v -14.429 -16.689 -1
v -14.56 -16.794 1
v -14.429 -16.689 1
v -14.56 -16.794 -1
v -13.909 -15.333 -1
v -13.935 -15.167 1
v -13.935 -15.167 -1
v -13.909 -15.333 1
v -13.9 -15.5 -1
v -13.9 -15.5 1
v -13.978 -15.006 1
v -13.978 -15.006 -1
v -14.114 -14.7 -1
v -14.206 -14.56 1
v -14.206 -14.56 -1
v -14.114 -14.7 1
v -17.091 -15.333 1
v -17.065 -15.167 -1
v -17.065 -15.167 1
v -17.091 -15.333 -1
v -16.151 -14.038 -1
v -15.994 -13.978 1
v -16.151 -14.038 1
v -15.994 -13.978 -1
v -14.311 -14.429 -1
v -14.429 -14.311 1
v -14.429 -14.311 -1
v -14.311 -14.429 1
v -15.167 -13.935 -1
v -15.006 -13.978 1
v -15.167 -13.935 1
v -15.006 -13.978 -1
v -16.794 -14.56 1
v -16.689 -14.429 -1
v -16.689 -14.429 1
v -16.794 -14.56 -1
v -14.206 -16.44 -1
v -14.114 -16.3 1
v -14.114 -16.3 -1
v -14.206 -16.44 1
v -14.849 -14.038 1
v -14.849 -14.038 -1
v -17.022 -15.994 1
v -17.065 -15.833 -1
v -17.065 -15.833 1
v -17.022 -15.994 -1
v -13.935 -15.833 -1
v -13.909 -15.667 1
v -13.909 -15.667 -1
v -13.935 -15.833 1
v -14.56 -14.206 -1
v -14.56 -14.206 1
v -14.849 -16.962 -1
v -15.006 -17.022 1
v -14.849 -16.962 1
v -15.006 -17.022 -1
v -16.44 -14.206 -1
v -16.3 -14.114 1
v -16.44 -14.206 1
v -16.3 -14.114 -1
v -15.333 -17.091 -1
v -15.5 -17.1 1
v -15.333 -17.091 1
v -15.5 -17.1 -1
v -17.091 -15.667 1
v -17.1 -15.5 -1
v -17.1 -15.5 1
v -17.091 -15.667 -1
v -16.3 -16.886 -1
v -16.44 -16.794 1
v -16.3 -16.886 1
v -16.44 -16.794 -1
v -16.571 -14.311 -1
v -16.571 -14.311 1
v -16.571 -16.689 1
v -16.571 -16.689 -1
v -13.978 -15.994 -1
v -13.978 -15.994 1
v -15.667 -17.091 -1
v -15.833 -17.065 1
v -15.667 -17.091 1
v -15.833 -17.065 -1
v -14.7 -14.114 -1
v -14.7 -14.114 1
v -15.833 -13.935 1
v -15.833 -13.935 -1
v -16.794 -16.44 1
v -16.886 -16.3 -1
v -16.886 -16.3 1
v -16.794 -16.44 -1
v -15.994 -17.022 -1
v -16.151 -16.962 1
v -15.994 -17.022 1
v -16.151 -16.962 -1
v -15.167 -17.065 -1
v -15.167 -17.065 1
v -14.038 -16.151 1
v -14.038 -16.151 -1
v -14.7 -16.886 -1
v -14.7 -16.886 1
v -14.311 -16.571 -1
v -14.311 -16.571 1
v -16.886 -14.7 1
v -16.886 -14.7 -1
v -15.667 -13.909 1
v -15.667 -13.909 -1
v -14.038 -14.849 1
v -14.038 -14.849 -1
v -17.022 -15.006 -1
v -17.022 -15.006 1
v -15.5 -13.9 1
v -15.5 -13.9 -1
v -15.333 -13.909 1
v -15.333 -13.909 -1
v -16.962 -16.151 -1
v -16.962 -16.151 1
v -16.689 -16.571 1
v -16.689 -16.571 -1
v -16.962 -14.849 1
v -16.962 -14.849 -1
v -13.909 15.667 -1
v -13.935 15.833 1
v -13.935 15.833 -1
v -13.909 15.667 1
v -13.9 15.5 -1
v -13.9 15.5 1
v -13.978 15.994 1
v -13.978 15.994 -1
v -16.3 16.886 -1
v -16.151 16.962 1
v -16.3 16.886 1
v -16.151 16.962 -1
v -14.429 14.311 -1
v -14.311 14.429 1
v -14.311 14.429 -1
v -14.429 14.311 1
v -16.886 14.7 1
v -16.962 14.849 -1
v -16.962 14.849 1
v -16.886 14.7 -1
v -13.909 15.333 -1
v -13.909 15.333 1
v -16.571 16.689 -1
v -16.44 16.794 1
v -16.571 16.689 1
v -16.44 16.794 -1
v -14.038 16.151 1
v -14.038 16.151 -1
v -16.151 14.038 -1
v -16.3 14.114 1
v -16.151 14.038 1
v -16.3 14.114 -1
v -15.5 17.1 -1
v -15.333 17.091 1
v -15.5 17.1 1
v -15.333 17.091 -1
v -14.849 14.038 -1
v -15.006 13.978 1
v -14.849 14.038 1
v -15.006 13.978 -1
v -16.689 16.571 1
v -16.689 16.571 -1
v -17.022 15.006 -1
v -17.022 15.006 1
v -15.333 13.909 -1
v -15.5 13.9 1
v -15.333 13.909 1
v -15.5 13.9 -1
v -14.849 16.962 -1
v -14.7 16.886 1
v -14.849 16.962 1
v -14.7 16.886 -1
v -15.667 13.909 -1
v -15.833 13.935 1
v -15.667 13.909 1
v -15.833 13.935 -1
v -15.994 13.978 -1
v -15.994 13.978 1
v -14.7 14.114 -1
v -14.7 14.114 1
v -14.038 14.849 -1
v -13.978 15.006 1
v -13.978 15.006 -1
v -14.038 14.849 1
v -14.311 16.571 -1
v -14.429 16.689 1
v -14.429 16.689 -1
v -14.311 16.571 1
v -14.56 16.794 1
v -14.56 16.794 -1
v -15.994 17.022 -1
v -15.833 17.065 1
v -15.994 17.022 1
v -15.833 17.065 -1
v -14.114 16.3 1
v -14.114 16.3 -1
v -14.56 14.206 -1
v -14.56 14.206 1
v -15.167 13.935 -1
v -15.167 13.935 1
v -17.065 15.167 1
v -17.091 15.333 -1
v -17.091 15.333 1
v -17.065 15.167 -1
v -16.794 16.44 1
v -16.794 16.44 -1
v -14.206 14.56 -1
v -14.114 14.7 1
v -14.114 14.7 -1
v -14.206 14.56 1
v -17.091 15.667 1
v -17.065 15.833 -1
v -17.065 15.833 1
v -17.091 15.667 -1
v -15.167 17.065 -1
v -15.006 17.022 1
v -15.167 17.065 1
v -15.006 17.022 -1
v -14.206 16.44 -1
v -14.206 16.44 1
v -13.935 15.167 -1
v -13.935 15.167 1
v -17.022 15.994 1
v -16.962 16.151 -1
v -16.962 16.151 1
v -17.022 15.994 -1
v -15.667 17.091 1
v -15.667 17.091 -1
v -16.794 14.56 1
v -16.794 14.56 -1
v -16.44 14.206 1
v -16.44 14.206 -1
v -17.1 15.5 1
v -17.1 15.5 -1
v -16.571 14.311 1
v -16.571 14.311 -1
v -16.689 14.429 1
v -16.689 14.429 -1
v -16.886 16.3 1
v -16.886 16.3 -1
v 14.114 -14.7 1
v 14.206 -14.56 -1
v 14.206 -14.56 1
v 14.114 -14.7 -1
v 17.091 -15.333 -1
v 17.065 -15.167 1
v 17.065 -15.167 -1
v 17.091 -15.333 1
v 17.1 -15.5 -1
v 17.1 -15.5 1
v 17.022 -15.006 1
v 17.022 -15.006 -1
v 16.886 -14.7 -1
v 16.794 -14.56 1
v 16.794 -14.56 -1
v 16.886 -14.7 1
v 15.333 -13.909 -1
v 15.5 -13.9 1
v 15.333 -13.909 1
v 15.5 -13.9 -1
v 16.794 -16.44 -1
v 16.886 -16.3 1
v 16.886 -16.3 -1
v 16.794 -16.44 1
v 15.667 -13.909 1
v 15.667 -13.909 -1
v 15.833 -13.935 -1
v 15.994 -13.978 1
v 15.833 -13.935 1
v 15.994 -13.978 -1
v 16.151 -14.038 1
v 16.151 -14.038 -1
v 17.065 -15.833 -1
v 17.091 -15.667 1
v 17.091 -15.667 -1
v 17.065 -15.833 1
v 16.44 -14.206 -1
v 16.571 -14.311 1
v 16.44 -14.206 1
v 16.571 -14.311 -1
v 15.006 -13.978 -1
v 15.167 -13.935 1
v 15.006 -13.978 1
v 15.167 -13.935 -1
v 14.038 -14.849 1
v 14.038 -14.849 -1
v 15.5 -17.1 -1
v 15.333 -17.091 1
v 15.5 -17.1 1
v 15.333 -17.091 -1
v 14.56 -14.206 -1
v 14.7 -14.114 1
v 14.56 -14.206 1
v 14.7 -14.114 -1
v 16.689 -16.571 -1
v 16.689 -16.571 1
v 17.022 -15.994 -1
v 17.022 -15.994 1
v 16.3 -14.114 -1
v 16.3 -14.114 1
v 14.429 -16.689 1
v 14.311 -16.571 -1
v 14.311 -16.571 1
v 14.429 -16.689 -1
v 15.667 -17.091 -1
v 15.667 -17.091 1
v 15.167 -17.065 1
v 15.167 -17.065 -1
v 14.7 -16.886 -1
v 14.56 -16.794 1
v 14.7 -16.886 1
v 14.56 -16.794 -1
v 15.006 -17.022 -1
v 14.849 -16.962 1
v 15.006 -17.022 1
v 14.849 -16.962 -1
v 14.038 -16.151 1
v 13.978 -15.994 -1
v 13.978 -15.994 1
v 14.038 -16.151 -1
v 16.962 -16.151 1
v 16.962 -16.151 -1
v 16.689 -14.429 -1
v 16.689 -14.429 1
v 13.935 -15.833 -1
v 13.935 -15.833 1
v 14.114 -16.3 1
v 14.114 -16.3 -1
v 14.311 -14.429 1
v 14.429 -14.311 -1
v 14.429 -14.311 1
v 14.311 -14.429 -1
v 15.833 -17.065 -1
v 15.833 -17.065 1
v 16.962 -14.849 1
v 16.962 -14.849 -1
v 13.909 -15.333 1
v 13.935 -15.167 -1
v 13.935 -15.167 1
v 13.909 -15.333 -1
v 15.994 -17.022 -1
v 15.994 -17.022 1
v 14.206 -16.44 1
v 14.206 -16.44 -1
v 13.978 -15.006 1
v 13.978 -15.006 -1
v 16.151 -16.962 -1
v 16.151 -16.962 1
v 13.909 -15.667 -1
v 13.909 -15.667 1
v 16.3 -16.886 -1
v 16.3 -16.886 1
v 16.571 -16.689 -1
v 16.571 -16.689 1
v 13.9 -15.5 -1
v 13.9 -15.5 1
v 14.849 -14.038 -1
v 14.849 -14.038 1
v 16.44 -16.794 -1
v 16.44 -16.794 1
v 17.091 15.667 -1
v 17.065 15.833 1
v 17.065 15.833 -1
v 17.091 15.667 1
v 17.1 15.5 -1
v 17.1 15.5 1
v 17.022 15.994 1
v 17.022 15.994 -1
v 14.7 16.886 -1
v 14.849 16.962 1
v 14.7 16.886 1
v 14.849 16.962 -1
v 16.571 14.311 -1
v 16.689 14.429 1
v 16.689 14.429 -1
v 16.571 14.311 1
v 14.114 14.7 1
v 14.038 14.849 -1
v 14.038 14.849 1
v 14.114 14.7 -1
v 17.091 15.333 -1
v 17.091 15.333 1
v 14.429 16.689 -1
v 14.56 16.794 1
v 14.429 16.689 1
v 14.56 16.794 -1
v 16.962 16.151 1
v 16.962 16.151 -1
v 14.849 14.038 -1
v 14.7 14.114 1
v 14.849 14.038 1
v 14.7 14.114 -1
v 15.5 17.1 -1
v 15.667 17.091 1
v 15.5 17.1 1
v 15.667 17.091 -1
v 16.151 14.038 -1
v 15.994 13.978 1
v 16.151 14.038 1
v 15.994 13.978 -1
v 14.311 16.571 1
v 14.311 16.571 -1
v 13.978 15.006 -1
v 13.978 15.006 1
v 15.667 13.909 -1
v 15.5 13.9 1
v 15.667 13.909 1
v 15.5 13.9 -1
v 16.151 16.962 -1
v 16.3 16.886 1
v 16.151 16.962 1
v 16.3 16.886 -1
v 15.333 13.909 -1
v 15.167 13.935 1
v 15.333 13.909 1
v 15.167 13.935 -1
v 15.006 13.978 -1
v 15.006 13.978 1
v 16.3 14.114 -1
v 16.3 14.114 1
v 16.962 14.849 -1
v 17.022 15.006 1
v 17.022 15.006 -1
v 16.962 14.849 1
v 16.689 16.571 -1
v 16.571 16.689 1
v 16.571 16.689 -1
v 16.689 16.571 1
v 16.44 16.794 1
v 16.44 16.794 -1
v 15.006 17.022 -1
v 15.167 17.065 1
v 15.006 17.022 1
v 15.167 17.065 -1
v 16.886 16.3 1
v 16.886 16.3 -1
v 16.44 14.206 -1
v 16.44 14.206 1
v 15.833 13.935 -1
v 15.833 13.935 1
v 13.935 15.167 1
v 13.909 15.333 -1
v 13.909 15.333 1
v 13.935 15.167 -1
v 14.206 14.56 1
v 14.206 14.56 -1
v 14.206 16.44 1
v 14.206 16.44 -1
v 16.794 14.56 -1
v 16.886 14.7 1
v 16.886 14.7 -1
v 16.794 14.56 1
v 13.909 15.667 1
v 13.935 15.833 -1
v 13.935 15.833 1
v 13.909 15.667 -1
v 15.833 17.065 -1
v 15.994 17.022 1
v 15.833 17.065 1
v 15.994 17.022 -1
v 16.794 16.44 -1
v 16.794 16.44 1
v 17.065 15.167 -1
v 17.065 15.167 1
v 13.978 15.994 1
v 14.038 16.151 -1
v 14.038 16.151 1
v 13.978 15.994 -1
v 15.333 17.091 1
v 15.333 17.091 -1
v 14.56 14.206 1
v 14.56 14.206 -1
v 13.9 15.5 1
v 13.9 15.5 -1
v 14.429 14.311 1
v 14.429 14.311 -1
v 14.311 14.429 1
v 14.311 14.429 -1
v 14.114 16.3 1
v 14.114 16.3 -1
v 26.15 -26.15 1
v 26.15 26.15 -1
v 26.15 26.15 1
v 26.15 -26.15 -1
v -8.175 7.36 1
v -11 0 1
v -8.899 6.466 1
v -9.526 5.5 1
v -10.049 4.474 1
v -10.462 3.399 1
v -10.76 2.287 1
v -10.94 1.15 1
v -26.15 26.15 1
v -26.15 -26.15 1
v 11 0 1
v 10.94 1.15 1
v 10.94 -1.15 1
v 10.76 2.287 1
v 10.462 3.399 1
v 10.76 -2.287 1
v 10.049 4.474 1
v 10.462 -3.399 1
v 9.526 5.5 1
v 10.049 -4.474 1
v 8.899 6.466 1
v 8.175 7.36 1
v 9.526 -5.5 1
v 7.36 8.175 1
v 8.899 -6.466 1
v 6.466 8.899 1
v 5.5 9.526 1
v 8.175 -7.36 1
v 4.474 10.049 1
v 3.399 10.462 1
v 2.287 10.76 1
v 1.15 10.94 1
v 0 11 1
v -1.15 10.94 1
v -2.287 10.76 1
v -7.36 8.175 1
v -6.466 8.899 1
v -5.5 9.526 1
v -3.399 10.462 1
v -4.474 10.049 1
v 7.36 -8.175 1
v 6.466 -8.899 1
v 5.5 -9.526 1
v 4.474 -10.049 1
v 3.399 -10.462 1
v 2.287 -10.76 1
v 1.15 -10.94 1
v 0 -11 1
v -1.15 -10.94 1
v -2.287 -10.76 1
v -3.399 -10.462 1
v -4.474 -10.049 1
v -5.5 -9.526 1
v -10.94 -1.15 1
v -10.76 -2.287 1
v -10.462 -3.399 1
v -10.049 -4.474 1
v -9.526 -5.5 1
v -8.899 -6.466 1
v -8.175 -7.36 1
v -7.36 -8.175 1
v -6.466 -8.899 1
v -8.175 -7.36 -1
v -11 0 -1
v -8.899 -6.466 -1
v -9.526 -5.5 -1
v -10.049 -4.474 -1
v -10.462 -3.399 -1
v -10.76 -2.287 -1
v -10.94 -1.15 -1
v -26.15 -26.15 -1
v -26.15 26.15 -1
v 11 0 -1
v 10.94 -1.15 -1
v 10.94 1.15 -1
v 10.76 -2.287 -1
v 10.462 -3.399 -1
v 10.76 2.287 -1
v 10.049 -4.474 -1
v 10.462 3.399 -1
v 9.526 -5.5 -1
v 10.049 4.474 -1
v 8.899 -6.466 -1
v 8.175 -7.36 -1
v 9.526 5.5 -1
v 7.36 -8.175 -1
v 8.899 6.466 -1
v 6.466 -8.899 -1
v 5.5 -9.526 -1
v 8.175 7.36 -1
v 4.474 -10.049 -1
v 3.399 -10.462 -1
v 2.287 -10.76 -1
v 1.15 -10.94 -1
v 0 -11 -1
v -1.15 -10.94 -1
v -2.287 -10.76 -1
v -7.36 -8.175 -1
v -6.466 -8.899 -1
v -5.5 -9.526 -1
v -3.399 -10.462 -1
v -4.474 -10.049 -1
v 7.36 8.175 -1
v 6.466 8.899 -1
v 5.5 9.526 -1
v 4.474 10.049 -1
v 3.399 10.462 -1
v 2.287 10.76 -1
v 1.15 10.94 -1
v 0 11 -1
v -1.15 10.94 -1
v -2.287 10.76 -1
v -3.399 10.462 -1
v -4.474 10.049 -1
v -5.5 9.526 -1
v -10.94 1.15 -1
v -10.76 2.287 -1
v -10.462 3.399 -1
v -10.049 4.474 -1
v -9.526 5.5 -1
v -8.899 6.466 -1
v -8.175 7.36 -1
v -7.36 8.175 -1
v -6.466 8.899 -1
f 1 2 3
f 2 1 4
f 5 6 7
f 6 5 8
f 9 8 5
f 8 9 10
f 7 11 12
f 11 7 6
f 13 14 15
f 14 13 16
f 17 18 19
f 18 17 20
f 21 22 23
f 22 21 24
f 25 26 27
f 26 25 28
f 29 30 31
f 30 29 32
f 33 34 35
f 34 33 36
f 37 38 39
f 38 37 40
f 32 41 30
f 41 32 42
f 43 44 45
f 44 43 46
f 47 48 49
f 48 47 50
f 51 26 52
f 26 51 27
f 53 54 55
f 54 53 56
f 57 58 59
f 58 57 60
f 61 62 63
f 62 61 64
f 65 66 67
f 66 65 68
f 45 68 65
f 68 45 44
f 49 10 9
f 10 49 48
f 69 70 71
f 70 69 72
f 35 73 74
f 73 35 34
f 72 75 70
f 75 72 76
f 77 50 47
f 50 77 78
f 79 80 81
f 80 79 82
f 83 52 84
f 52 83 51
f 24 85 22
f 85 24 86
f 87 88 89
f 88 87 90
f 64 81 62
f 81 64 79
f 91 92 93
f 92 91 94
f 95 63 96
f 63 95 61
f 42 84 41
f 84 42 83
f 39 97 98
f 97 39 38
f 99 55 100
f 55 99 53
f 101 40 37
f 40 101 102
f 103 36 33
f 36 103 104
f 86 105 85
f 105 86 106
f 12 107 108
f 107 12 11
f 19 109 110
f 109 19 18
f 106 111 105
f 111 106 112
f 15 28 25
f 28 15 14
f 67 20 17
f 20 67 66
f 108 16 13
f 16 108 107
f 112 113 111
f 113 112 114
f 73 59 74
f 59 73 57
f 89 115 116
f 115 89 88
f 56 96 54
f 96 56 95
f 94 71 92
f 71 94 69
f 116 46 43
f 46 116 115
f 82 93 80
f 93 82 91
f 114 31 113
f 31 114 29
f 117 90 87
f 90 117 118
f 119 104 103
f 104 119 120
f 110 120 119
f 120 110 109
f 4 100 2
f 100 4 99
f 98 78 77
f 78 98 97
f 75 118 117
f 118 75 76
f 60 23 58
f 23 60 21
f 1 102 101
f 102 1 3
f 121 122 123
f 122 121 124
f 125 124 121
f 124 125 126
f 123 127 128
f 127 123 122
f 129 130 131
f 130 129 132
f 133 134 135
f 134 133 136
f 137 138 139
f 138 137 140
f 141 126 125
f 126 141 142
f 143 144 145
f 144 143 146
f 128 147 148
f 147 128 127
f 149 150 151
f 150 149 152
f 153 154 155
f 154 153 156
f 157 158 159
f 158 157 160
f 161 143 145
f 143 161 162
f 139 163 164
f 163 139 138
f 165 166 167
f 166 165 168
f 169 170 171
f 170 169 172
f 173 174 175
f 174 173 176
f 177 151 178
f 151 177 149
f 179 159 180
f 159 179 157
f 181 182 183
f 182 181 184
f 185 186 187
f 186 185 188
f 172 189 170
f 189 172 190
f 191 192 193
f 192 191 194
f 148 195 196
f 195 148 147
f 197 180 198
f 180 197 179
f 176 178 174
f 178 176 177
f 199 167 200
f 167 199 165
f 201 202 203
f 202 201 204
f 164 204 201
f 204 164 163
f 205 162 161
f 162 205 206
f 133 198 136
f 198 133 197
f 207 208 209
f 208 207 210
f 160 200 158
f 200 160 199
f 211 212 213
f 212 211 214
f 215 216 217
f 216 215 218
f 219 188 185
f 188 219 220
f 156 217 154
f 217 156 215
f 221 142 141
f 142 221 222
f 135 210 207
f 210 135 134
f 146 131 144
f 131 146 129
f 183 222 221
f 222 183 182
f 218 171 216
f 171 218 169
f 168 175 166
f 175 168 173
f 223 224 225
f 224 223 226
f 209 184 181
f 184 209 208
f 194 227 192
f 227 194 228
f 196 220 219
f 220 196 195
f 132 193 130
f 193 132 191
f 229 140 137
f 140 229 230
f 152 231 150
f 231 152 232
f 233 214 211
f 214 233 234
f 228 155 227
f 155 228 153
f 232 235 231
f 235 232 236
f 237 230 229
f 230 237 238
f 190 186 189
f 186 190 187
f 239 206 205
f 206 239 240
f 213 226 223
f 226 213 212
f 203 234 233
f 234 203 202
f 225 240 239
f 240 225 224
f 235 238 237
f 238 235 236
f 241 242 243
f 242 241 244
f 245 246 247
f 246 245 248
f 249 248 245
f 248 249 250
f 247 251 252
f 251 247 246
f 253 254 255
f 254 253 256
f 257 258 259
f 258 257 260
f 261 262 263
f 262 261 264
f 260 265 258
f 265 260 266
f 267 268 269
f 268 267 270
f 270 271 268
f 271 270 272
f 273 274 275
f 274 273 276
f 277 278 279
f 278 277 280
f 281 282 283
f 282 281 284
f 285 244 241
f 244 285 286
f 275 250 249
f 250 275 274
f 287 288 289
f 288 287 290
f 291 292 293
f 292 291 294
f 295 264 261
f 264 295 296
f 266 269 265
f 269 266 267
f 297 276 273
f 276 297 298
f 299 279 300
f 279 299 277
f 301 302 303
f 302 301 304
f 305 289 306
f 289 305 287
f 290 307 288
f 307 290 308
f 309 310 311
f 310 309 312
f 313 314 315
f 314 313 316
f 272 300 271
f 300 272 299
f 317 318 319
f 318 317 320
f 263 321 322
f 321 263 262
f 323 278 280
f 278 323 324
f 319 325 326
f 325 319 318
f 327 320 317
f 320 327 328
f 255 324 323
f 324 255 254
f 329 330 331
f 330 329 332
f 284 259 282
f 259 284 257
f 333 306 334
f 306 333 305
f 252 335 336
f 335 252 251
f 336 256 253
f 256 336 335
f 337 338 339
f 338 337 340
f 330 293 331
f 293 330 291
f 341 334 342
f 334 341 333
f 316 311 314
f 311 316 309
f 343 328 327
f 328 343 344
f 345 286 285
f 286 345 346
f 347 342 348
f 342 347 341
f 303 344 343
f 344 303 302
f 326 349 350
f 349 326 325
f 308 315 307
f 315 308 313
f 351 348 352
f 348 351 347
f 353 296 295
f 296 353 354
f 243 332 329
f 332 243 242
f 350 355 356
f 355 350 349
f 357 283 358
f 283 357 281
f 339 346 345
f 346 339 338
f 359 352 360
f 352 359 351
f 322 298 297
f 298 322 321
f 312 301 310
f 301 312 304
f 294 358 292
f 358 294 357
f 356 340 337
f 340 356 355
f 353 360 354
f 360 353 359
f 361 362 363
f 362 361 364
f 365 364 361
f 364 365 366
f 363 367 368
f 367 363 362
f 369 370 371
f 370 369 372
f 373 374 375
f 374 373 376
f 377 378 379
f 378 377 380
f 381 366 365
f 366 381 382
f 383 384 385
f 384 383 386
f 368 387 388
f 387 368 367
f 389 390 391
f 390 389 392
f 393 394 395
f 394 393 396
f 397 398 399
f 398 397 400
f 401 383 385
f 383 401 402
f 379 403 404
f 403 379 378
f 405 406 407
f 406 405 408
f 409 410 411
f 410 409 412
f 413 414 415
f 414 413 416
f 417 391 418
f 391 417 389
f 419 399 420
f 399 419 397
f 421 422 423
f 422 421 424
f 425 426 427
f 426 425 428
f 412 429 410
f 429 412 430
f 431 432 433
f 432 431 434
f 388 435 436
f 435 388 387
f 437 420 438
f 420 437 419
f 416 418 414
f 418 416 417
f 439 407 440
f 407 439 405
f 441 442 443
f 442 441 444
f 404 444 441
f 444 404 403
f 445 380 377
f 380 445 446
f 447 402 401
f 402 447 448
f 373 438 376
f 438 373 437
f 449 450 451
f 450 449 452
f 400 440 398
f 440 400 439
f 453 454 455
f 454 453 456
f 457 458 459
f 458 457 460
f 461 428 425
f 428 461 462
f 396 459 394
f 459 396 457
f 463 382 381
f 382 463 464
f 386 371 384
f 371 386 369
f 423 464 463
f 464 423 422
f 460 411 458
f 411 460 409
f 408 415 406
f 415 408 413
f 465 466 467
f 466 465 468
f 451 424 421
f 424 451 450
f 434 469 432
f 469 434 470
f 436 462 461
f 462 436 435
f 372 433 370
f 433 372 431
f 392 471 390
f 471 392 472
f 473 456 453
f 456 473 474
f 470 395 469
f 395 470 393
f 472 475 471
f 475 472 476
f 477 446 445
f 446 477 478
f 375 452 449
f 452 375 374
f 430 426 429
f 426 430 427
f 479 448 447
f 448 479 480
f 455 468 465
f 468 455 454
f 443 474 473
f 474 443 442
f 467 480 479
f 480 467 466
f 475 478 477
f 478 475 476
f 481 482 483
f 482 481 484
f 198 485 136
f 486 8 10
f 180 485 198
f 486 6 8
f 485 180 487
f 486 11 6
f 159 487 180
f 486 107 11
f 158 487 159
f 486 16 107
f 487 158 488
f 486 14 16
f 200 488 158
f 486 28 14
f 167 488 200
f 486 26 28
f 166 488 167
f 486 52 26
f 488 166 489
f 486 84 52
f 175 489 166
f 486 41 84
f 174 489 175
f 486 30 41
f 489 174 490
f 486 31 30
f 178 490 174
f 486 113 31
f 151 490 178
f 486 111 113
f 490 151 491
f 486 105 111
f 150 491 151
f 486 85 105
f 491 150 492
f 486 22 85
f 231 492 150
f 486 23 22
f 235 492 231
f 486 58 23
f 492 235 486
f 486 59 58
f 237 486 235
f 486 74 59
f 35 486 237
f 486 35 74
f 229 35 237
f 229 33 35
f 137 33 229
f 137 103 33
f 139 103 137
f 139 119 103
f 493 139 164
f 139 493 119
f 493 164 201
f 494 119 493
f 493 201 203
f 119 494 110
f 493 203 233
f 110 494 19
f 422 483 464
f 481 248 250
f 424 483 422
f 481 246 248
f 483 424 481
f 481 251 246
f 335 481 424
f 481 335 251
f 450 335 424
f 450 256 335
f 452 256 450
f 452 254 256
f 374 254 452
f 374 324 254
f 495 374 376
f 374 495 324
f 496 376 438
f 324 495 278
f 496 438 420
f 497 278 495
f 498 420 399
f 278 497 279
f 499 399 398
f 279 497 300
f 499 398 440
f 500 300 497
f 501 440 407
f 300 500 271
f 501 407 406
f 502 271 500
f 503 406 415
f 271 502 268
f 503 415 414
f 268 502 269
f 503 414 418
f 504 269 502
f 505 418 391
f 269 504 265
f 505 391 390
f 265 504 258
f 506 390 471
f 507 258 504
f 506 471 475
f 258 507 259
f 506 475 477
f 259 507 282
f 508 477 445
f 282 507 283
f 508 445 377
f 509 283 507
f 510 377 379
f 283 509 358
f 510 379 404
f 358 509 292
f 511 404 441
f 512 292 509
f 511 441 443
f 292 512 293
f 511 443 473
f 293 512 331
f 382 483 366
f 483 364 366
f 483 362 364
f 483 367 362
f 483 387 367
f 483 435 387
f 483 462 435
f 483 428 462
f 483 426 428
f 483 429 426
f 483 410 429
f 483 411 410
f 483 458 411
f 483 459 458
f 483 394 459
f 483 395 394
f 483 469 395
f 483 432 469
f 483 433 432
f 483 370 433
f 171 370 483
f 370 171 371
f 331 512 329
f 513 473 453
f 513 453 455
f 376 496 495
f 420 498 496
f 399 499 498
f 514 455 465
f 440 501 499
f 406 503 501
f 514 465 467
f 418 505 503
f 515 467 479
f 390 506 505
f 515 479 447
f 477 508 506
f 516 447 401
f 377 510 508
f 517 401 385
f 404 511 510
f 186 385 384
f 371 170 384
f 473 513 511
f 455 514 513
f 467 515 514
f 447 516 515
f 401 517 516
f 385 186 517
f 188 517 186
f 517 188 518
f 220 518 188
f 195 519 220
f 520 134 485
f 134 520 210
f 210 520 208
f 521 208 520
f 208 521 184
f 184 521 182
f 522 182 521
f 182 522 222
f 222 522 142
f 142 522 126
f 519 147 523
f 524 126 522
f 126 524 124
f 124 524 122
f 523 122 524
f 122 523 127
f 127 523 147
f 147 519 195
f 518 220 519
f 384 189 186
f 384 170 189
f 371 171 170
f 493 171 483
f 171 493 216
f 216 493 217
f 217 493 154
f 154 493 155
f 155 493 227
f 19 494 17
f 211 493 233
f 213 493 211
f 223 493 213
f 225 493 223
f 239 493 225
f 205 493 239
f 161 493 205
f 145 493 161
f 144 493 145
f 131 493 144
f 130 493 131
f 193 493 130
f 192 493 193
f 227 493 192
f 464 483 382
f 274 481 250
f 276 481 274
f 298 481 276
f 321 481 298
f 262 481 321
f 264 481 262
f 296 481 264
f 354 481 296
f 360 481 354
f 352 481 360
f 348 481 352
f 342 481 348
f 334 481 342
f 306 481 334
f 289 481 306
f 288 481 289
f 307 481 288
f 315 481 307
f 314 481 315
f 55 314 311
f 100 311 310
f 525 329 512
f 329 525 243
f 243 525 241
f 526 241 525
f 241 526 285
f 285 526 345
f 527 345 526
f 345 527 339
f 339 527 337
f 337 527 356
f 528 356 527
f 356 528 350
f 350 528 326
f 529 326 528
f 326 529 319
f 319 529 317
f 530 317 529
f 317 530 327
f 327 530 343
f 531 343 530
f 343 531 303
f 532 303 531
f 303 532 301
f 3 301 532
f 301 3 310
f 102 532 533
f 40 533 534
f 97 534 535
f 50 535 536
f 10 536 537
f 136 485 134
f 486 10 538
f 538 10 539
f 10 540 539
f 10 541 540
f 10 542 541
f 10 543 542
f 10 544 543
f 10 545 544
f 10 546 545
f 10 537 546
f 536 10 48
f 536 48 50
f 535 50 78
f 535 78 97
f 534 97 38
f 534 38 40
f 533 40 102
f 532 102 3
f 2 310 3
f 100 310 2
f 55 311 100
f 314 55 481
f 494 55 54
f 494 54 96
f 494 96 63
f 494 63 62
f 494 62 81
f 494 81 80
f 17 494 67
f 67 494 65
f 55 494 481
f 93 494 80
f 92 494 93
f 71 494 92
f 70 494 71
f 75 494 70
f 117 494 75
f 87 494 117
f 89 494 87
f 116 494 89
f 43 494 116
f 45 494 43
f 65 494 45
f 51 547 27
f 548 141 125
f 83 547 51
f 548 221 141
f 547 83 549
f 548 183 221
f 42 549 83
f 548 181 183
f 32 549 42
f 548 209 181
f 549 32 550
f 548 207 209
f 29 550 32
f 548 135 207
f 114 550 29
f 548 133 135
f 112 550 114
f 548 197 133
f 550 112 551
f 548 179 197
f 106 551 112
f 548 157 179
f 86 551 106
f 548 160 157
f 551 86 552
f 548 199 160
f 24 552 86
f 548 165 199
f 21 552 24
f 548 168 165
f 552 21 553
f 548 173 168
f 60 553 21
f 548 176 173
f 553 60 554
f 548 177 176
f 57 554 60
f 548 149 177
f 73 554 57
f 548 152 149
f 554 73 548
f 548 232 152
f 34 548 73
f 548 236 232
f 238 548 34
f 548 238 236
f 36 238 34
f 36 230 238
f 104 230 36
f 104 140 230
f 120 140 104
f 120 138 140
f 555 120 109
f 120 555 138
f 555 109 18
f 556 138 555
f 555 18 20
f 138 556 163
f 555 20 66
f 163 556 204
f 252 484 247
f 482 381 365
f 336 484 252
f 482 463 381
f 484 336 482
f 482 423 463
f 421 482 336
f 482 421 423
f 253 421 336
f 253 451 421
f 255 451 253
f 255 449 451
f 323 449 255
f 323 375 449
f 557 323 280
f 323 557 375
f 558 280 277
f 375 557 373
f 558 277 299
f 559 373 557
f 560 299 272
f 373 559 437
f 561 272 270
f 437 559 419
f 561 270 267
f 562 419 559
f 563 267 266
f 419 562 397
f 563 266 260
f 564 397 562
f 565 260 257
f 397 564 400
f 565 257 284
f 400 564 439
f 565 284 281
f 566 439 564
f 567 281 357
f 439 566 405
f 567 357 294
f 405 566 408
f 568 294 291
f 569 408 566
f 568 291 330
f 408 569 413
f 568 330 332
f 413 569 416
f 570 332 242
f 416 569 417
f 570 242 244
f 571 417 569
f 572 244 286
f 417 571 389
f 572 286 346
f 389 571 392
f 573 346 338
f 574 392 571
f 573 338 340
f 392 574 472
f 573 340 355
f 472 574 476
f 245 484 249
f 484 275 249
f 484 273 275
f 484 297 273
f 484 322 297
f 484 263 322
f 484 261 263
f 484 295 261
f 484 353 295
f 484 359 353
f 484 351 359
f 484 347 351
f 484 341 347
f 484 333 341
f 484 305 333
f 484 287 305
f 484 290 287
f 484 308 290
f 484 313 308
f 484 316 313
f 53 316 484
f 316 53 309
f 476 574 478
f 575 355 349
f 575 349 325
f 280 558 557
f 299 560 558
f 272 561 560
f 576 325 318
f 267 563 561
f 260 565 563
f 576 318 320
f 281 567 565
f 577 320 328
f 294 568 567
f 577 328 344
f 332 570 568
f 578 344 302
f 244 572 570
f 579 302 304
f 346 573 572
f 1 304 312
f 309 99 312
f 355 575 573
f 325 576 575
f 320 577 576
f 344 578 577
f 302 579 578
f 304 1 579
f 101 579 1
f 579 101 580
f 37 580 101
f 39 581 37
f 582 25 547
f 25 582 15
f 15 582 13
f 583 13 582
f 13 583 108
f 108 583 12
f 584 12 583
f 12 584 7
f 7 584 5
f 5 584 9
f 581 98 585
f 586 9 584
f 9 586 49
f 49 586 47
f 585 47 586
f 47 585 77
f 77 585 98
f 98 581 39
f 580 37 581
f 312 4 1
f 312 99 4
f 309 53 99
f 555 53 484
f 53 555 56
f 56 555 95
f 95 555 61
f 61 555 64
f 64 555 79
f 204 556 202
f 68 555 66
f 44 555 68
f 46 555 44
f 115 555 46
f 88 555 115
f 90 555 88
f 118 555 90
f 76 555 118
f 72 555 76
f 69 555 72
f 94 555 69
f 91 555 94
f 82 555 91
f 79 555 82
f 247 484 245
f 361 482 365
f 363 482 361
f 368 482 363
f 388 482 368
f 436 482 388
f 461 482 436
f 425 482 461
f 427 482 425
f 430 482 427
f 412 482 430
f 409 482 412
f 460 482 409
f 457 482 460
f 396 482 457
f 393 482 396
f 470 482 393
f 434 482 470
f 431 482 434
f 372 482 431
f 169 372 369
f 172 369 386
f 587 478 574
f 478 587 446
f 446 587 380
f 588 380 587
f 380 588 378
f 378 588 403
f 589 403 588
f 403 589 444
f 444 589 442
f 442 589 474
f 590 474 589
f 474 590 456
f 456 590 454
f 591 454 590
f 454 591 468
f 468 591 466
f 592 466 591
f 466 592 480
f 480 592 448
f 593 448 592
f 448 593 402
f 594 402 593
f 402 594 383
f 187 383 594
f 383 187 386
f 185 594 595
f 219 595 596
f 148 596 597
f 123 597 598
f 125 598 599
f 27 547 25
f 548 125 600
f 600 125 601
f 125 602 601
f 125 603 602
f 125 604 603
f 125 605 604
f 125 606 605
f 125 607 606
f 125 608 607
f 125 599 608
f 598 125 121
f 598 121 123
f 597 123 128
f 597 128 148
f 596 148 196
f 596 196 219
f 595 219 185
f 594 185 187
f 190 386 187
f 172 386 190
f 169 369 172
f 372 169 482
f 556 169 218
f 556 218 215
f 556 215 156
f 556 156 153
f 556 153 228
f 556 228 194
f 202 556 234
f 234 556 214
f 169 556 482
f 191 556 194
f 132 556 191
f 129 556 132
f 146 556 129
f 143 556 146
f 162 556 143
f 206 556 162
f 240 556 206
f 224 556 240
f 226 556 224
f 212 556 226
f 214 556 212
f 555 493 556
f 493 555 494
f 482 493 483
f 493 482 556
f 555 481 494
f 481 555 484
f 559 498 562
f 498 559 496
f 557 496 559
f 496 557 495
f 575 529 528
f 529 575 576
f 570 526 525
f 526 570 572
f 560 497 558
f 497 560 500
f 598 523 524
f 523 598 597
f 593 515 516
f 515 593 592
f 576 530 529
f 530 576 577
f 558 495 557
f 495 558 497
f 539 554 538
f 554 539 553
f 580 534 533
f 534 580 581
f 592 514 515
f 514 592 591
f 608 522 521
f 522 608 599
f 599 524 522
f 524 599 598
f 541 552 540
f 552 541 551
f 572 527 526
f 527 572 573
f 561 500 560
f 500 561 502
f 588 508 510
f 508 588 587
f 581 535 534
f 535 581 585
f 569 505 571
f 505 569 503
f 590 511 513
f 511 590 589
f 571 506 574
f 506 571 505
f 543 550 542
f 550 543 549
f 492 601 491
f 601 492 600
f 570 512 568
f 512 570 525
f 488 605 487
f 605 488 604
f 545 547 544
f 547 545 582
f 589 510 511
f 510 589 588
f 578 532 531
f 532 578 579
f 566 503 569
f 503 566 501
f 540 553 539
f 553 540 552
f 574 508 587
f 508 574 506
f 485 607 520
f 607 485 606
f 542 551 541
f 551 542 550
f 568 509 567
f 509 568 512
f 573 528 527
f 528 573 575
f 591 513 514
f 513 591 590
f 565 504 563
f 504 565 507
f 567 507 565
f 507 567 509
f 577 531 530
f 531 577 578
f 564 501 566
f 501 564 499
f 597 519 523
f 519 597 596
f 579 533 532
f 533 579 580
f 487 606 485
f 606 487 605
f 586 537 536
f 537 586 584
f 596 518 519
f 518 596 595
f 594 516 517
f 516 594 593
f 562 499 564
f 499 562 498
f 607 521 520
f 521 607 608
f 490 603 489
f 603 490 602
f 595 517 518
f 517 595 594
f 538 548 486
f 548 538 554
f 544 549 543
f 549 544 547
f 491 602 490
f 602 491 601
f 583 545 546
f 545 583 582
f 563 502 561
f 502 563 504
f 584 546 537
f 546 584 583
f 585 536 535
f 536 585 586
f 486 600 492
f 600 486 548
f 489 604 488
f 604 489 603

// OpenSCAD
/*
returns an array for NEMA Motors 17 and 23:
[Face Size, Hole Spacing, Pilot Boss Dia, Bolt Dia]
*/
function get_nema_specs(nema_size) = 
    (nema_size == 17) ? [42.3, 31.0, 22.0, 3.2] : ((nema_size == 23) ? [56.4, 47.1, 38.1, 5.2] : undef);


module nema_bolt_pattern(nema_size, depth, _eps=0.01)
{
    specs = get_nema_specs(nema_size);
    assert(specs != undef, "Unknown NEMA size!");
    assert(depth > 0, "Depth must be positive");

    face_size    = specs[0];
    hole_spacing = specs[1];
    pilot_dia    = specs[2];
    bolt_dia     = specs[3];

    _offset = hole_spacing / 2;

    for (x = [-1, 1], y =[-1, 1]) 
    {
        // center it instead of having -_eps in z
        translate([x * _offset, y * _offset, 0])
            cylinder(r=bolt_dia/2, h=depth + 2*_eps, center=true, $fn=60);
    }    
}

module nema_mount_plate(nema_size, plate_thickness, mount_type = "rectangular", _eps = 0.01) 
{
    specs = get_nema_specs(nema_size);
    assert(specs != undef, "Unknown NEMA size!");
    assert(plate_thickness > 0, "Plate thickness must be positive");

    assert(mount_type == "round" || mount_type == "rectangular", "only rectangular and round mount types supported");

    face_size = specs[0];
    spacing   = specs[1];
    pilot_dia = specs[2];
    bolt_dia  = specs[3];

    difference() 
    {
        if (mount_type == "rectangular")
        {
            cube(size=[face_size + 10, face_size + 10, plate_thickness], center=true);
        }
        else
        {
            cylinder(d=face_size + 10, h=plate_thickness, center=true);
        }

        cylinder(d=pilot_dia, h=plate_thickness + 2 * _eps, center=true, $fn=60);

        nema_bolt_pattern(nema_size, plate_thickness, _eps);
    }
}

nema_mount_plate(17, 2);
